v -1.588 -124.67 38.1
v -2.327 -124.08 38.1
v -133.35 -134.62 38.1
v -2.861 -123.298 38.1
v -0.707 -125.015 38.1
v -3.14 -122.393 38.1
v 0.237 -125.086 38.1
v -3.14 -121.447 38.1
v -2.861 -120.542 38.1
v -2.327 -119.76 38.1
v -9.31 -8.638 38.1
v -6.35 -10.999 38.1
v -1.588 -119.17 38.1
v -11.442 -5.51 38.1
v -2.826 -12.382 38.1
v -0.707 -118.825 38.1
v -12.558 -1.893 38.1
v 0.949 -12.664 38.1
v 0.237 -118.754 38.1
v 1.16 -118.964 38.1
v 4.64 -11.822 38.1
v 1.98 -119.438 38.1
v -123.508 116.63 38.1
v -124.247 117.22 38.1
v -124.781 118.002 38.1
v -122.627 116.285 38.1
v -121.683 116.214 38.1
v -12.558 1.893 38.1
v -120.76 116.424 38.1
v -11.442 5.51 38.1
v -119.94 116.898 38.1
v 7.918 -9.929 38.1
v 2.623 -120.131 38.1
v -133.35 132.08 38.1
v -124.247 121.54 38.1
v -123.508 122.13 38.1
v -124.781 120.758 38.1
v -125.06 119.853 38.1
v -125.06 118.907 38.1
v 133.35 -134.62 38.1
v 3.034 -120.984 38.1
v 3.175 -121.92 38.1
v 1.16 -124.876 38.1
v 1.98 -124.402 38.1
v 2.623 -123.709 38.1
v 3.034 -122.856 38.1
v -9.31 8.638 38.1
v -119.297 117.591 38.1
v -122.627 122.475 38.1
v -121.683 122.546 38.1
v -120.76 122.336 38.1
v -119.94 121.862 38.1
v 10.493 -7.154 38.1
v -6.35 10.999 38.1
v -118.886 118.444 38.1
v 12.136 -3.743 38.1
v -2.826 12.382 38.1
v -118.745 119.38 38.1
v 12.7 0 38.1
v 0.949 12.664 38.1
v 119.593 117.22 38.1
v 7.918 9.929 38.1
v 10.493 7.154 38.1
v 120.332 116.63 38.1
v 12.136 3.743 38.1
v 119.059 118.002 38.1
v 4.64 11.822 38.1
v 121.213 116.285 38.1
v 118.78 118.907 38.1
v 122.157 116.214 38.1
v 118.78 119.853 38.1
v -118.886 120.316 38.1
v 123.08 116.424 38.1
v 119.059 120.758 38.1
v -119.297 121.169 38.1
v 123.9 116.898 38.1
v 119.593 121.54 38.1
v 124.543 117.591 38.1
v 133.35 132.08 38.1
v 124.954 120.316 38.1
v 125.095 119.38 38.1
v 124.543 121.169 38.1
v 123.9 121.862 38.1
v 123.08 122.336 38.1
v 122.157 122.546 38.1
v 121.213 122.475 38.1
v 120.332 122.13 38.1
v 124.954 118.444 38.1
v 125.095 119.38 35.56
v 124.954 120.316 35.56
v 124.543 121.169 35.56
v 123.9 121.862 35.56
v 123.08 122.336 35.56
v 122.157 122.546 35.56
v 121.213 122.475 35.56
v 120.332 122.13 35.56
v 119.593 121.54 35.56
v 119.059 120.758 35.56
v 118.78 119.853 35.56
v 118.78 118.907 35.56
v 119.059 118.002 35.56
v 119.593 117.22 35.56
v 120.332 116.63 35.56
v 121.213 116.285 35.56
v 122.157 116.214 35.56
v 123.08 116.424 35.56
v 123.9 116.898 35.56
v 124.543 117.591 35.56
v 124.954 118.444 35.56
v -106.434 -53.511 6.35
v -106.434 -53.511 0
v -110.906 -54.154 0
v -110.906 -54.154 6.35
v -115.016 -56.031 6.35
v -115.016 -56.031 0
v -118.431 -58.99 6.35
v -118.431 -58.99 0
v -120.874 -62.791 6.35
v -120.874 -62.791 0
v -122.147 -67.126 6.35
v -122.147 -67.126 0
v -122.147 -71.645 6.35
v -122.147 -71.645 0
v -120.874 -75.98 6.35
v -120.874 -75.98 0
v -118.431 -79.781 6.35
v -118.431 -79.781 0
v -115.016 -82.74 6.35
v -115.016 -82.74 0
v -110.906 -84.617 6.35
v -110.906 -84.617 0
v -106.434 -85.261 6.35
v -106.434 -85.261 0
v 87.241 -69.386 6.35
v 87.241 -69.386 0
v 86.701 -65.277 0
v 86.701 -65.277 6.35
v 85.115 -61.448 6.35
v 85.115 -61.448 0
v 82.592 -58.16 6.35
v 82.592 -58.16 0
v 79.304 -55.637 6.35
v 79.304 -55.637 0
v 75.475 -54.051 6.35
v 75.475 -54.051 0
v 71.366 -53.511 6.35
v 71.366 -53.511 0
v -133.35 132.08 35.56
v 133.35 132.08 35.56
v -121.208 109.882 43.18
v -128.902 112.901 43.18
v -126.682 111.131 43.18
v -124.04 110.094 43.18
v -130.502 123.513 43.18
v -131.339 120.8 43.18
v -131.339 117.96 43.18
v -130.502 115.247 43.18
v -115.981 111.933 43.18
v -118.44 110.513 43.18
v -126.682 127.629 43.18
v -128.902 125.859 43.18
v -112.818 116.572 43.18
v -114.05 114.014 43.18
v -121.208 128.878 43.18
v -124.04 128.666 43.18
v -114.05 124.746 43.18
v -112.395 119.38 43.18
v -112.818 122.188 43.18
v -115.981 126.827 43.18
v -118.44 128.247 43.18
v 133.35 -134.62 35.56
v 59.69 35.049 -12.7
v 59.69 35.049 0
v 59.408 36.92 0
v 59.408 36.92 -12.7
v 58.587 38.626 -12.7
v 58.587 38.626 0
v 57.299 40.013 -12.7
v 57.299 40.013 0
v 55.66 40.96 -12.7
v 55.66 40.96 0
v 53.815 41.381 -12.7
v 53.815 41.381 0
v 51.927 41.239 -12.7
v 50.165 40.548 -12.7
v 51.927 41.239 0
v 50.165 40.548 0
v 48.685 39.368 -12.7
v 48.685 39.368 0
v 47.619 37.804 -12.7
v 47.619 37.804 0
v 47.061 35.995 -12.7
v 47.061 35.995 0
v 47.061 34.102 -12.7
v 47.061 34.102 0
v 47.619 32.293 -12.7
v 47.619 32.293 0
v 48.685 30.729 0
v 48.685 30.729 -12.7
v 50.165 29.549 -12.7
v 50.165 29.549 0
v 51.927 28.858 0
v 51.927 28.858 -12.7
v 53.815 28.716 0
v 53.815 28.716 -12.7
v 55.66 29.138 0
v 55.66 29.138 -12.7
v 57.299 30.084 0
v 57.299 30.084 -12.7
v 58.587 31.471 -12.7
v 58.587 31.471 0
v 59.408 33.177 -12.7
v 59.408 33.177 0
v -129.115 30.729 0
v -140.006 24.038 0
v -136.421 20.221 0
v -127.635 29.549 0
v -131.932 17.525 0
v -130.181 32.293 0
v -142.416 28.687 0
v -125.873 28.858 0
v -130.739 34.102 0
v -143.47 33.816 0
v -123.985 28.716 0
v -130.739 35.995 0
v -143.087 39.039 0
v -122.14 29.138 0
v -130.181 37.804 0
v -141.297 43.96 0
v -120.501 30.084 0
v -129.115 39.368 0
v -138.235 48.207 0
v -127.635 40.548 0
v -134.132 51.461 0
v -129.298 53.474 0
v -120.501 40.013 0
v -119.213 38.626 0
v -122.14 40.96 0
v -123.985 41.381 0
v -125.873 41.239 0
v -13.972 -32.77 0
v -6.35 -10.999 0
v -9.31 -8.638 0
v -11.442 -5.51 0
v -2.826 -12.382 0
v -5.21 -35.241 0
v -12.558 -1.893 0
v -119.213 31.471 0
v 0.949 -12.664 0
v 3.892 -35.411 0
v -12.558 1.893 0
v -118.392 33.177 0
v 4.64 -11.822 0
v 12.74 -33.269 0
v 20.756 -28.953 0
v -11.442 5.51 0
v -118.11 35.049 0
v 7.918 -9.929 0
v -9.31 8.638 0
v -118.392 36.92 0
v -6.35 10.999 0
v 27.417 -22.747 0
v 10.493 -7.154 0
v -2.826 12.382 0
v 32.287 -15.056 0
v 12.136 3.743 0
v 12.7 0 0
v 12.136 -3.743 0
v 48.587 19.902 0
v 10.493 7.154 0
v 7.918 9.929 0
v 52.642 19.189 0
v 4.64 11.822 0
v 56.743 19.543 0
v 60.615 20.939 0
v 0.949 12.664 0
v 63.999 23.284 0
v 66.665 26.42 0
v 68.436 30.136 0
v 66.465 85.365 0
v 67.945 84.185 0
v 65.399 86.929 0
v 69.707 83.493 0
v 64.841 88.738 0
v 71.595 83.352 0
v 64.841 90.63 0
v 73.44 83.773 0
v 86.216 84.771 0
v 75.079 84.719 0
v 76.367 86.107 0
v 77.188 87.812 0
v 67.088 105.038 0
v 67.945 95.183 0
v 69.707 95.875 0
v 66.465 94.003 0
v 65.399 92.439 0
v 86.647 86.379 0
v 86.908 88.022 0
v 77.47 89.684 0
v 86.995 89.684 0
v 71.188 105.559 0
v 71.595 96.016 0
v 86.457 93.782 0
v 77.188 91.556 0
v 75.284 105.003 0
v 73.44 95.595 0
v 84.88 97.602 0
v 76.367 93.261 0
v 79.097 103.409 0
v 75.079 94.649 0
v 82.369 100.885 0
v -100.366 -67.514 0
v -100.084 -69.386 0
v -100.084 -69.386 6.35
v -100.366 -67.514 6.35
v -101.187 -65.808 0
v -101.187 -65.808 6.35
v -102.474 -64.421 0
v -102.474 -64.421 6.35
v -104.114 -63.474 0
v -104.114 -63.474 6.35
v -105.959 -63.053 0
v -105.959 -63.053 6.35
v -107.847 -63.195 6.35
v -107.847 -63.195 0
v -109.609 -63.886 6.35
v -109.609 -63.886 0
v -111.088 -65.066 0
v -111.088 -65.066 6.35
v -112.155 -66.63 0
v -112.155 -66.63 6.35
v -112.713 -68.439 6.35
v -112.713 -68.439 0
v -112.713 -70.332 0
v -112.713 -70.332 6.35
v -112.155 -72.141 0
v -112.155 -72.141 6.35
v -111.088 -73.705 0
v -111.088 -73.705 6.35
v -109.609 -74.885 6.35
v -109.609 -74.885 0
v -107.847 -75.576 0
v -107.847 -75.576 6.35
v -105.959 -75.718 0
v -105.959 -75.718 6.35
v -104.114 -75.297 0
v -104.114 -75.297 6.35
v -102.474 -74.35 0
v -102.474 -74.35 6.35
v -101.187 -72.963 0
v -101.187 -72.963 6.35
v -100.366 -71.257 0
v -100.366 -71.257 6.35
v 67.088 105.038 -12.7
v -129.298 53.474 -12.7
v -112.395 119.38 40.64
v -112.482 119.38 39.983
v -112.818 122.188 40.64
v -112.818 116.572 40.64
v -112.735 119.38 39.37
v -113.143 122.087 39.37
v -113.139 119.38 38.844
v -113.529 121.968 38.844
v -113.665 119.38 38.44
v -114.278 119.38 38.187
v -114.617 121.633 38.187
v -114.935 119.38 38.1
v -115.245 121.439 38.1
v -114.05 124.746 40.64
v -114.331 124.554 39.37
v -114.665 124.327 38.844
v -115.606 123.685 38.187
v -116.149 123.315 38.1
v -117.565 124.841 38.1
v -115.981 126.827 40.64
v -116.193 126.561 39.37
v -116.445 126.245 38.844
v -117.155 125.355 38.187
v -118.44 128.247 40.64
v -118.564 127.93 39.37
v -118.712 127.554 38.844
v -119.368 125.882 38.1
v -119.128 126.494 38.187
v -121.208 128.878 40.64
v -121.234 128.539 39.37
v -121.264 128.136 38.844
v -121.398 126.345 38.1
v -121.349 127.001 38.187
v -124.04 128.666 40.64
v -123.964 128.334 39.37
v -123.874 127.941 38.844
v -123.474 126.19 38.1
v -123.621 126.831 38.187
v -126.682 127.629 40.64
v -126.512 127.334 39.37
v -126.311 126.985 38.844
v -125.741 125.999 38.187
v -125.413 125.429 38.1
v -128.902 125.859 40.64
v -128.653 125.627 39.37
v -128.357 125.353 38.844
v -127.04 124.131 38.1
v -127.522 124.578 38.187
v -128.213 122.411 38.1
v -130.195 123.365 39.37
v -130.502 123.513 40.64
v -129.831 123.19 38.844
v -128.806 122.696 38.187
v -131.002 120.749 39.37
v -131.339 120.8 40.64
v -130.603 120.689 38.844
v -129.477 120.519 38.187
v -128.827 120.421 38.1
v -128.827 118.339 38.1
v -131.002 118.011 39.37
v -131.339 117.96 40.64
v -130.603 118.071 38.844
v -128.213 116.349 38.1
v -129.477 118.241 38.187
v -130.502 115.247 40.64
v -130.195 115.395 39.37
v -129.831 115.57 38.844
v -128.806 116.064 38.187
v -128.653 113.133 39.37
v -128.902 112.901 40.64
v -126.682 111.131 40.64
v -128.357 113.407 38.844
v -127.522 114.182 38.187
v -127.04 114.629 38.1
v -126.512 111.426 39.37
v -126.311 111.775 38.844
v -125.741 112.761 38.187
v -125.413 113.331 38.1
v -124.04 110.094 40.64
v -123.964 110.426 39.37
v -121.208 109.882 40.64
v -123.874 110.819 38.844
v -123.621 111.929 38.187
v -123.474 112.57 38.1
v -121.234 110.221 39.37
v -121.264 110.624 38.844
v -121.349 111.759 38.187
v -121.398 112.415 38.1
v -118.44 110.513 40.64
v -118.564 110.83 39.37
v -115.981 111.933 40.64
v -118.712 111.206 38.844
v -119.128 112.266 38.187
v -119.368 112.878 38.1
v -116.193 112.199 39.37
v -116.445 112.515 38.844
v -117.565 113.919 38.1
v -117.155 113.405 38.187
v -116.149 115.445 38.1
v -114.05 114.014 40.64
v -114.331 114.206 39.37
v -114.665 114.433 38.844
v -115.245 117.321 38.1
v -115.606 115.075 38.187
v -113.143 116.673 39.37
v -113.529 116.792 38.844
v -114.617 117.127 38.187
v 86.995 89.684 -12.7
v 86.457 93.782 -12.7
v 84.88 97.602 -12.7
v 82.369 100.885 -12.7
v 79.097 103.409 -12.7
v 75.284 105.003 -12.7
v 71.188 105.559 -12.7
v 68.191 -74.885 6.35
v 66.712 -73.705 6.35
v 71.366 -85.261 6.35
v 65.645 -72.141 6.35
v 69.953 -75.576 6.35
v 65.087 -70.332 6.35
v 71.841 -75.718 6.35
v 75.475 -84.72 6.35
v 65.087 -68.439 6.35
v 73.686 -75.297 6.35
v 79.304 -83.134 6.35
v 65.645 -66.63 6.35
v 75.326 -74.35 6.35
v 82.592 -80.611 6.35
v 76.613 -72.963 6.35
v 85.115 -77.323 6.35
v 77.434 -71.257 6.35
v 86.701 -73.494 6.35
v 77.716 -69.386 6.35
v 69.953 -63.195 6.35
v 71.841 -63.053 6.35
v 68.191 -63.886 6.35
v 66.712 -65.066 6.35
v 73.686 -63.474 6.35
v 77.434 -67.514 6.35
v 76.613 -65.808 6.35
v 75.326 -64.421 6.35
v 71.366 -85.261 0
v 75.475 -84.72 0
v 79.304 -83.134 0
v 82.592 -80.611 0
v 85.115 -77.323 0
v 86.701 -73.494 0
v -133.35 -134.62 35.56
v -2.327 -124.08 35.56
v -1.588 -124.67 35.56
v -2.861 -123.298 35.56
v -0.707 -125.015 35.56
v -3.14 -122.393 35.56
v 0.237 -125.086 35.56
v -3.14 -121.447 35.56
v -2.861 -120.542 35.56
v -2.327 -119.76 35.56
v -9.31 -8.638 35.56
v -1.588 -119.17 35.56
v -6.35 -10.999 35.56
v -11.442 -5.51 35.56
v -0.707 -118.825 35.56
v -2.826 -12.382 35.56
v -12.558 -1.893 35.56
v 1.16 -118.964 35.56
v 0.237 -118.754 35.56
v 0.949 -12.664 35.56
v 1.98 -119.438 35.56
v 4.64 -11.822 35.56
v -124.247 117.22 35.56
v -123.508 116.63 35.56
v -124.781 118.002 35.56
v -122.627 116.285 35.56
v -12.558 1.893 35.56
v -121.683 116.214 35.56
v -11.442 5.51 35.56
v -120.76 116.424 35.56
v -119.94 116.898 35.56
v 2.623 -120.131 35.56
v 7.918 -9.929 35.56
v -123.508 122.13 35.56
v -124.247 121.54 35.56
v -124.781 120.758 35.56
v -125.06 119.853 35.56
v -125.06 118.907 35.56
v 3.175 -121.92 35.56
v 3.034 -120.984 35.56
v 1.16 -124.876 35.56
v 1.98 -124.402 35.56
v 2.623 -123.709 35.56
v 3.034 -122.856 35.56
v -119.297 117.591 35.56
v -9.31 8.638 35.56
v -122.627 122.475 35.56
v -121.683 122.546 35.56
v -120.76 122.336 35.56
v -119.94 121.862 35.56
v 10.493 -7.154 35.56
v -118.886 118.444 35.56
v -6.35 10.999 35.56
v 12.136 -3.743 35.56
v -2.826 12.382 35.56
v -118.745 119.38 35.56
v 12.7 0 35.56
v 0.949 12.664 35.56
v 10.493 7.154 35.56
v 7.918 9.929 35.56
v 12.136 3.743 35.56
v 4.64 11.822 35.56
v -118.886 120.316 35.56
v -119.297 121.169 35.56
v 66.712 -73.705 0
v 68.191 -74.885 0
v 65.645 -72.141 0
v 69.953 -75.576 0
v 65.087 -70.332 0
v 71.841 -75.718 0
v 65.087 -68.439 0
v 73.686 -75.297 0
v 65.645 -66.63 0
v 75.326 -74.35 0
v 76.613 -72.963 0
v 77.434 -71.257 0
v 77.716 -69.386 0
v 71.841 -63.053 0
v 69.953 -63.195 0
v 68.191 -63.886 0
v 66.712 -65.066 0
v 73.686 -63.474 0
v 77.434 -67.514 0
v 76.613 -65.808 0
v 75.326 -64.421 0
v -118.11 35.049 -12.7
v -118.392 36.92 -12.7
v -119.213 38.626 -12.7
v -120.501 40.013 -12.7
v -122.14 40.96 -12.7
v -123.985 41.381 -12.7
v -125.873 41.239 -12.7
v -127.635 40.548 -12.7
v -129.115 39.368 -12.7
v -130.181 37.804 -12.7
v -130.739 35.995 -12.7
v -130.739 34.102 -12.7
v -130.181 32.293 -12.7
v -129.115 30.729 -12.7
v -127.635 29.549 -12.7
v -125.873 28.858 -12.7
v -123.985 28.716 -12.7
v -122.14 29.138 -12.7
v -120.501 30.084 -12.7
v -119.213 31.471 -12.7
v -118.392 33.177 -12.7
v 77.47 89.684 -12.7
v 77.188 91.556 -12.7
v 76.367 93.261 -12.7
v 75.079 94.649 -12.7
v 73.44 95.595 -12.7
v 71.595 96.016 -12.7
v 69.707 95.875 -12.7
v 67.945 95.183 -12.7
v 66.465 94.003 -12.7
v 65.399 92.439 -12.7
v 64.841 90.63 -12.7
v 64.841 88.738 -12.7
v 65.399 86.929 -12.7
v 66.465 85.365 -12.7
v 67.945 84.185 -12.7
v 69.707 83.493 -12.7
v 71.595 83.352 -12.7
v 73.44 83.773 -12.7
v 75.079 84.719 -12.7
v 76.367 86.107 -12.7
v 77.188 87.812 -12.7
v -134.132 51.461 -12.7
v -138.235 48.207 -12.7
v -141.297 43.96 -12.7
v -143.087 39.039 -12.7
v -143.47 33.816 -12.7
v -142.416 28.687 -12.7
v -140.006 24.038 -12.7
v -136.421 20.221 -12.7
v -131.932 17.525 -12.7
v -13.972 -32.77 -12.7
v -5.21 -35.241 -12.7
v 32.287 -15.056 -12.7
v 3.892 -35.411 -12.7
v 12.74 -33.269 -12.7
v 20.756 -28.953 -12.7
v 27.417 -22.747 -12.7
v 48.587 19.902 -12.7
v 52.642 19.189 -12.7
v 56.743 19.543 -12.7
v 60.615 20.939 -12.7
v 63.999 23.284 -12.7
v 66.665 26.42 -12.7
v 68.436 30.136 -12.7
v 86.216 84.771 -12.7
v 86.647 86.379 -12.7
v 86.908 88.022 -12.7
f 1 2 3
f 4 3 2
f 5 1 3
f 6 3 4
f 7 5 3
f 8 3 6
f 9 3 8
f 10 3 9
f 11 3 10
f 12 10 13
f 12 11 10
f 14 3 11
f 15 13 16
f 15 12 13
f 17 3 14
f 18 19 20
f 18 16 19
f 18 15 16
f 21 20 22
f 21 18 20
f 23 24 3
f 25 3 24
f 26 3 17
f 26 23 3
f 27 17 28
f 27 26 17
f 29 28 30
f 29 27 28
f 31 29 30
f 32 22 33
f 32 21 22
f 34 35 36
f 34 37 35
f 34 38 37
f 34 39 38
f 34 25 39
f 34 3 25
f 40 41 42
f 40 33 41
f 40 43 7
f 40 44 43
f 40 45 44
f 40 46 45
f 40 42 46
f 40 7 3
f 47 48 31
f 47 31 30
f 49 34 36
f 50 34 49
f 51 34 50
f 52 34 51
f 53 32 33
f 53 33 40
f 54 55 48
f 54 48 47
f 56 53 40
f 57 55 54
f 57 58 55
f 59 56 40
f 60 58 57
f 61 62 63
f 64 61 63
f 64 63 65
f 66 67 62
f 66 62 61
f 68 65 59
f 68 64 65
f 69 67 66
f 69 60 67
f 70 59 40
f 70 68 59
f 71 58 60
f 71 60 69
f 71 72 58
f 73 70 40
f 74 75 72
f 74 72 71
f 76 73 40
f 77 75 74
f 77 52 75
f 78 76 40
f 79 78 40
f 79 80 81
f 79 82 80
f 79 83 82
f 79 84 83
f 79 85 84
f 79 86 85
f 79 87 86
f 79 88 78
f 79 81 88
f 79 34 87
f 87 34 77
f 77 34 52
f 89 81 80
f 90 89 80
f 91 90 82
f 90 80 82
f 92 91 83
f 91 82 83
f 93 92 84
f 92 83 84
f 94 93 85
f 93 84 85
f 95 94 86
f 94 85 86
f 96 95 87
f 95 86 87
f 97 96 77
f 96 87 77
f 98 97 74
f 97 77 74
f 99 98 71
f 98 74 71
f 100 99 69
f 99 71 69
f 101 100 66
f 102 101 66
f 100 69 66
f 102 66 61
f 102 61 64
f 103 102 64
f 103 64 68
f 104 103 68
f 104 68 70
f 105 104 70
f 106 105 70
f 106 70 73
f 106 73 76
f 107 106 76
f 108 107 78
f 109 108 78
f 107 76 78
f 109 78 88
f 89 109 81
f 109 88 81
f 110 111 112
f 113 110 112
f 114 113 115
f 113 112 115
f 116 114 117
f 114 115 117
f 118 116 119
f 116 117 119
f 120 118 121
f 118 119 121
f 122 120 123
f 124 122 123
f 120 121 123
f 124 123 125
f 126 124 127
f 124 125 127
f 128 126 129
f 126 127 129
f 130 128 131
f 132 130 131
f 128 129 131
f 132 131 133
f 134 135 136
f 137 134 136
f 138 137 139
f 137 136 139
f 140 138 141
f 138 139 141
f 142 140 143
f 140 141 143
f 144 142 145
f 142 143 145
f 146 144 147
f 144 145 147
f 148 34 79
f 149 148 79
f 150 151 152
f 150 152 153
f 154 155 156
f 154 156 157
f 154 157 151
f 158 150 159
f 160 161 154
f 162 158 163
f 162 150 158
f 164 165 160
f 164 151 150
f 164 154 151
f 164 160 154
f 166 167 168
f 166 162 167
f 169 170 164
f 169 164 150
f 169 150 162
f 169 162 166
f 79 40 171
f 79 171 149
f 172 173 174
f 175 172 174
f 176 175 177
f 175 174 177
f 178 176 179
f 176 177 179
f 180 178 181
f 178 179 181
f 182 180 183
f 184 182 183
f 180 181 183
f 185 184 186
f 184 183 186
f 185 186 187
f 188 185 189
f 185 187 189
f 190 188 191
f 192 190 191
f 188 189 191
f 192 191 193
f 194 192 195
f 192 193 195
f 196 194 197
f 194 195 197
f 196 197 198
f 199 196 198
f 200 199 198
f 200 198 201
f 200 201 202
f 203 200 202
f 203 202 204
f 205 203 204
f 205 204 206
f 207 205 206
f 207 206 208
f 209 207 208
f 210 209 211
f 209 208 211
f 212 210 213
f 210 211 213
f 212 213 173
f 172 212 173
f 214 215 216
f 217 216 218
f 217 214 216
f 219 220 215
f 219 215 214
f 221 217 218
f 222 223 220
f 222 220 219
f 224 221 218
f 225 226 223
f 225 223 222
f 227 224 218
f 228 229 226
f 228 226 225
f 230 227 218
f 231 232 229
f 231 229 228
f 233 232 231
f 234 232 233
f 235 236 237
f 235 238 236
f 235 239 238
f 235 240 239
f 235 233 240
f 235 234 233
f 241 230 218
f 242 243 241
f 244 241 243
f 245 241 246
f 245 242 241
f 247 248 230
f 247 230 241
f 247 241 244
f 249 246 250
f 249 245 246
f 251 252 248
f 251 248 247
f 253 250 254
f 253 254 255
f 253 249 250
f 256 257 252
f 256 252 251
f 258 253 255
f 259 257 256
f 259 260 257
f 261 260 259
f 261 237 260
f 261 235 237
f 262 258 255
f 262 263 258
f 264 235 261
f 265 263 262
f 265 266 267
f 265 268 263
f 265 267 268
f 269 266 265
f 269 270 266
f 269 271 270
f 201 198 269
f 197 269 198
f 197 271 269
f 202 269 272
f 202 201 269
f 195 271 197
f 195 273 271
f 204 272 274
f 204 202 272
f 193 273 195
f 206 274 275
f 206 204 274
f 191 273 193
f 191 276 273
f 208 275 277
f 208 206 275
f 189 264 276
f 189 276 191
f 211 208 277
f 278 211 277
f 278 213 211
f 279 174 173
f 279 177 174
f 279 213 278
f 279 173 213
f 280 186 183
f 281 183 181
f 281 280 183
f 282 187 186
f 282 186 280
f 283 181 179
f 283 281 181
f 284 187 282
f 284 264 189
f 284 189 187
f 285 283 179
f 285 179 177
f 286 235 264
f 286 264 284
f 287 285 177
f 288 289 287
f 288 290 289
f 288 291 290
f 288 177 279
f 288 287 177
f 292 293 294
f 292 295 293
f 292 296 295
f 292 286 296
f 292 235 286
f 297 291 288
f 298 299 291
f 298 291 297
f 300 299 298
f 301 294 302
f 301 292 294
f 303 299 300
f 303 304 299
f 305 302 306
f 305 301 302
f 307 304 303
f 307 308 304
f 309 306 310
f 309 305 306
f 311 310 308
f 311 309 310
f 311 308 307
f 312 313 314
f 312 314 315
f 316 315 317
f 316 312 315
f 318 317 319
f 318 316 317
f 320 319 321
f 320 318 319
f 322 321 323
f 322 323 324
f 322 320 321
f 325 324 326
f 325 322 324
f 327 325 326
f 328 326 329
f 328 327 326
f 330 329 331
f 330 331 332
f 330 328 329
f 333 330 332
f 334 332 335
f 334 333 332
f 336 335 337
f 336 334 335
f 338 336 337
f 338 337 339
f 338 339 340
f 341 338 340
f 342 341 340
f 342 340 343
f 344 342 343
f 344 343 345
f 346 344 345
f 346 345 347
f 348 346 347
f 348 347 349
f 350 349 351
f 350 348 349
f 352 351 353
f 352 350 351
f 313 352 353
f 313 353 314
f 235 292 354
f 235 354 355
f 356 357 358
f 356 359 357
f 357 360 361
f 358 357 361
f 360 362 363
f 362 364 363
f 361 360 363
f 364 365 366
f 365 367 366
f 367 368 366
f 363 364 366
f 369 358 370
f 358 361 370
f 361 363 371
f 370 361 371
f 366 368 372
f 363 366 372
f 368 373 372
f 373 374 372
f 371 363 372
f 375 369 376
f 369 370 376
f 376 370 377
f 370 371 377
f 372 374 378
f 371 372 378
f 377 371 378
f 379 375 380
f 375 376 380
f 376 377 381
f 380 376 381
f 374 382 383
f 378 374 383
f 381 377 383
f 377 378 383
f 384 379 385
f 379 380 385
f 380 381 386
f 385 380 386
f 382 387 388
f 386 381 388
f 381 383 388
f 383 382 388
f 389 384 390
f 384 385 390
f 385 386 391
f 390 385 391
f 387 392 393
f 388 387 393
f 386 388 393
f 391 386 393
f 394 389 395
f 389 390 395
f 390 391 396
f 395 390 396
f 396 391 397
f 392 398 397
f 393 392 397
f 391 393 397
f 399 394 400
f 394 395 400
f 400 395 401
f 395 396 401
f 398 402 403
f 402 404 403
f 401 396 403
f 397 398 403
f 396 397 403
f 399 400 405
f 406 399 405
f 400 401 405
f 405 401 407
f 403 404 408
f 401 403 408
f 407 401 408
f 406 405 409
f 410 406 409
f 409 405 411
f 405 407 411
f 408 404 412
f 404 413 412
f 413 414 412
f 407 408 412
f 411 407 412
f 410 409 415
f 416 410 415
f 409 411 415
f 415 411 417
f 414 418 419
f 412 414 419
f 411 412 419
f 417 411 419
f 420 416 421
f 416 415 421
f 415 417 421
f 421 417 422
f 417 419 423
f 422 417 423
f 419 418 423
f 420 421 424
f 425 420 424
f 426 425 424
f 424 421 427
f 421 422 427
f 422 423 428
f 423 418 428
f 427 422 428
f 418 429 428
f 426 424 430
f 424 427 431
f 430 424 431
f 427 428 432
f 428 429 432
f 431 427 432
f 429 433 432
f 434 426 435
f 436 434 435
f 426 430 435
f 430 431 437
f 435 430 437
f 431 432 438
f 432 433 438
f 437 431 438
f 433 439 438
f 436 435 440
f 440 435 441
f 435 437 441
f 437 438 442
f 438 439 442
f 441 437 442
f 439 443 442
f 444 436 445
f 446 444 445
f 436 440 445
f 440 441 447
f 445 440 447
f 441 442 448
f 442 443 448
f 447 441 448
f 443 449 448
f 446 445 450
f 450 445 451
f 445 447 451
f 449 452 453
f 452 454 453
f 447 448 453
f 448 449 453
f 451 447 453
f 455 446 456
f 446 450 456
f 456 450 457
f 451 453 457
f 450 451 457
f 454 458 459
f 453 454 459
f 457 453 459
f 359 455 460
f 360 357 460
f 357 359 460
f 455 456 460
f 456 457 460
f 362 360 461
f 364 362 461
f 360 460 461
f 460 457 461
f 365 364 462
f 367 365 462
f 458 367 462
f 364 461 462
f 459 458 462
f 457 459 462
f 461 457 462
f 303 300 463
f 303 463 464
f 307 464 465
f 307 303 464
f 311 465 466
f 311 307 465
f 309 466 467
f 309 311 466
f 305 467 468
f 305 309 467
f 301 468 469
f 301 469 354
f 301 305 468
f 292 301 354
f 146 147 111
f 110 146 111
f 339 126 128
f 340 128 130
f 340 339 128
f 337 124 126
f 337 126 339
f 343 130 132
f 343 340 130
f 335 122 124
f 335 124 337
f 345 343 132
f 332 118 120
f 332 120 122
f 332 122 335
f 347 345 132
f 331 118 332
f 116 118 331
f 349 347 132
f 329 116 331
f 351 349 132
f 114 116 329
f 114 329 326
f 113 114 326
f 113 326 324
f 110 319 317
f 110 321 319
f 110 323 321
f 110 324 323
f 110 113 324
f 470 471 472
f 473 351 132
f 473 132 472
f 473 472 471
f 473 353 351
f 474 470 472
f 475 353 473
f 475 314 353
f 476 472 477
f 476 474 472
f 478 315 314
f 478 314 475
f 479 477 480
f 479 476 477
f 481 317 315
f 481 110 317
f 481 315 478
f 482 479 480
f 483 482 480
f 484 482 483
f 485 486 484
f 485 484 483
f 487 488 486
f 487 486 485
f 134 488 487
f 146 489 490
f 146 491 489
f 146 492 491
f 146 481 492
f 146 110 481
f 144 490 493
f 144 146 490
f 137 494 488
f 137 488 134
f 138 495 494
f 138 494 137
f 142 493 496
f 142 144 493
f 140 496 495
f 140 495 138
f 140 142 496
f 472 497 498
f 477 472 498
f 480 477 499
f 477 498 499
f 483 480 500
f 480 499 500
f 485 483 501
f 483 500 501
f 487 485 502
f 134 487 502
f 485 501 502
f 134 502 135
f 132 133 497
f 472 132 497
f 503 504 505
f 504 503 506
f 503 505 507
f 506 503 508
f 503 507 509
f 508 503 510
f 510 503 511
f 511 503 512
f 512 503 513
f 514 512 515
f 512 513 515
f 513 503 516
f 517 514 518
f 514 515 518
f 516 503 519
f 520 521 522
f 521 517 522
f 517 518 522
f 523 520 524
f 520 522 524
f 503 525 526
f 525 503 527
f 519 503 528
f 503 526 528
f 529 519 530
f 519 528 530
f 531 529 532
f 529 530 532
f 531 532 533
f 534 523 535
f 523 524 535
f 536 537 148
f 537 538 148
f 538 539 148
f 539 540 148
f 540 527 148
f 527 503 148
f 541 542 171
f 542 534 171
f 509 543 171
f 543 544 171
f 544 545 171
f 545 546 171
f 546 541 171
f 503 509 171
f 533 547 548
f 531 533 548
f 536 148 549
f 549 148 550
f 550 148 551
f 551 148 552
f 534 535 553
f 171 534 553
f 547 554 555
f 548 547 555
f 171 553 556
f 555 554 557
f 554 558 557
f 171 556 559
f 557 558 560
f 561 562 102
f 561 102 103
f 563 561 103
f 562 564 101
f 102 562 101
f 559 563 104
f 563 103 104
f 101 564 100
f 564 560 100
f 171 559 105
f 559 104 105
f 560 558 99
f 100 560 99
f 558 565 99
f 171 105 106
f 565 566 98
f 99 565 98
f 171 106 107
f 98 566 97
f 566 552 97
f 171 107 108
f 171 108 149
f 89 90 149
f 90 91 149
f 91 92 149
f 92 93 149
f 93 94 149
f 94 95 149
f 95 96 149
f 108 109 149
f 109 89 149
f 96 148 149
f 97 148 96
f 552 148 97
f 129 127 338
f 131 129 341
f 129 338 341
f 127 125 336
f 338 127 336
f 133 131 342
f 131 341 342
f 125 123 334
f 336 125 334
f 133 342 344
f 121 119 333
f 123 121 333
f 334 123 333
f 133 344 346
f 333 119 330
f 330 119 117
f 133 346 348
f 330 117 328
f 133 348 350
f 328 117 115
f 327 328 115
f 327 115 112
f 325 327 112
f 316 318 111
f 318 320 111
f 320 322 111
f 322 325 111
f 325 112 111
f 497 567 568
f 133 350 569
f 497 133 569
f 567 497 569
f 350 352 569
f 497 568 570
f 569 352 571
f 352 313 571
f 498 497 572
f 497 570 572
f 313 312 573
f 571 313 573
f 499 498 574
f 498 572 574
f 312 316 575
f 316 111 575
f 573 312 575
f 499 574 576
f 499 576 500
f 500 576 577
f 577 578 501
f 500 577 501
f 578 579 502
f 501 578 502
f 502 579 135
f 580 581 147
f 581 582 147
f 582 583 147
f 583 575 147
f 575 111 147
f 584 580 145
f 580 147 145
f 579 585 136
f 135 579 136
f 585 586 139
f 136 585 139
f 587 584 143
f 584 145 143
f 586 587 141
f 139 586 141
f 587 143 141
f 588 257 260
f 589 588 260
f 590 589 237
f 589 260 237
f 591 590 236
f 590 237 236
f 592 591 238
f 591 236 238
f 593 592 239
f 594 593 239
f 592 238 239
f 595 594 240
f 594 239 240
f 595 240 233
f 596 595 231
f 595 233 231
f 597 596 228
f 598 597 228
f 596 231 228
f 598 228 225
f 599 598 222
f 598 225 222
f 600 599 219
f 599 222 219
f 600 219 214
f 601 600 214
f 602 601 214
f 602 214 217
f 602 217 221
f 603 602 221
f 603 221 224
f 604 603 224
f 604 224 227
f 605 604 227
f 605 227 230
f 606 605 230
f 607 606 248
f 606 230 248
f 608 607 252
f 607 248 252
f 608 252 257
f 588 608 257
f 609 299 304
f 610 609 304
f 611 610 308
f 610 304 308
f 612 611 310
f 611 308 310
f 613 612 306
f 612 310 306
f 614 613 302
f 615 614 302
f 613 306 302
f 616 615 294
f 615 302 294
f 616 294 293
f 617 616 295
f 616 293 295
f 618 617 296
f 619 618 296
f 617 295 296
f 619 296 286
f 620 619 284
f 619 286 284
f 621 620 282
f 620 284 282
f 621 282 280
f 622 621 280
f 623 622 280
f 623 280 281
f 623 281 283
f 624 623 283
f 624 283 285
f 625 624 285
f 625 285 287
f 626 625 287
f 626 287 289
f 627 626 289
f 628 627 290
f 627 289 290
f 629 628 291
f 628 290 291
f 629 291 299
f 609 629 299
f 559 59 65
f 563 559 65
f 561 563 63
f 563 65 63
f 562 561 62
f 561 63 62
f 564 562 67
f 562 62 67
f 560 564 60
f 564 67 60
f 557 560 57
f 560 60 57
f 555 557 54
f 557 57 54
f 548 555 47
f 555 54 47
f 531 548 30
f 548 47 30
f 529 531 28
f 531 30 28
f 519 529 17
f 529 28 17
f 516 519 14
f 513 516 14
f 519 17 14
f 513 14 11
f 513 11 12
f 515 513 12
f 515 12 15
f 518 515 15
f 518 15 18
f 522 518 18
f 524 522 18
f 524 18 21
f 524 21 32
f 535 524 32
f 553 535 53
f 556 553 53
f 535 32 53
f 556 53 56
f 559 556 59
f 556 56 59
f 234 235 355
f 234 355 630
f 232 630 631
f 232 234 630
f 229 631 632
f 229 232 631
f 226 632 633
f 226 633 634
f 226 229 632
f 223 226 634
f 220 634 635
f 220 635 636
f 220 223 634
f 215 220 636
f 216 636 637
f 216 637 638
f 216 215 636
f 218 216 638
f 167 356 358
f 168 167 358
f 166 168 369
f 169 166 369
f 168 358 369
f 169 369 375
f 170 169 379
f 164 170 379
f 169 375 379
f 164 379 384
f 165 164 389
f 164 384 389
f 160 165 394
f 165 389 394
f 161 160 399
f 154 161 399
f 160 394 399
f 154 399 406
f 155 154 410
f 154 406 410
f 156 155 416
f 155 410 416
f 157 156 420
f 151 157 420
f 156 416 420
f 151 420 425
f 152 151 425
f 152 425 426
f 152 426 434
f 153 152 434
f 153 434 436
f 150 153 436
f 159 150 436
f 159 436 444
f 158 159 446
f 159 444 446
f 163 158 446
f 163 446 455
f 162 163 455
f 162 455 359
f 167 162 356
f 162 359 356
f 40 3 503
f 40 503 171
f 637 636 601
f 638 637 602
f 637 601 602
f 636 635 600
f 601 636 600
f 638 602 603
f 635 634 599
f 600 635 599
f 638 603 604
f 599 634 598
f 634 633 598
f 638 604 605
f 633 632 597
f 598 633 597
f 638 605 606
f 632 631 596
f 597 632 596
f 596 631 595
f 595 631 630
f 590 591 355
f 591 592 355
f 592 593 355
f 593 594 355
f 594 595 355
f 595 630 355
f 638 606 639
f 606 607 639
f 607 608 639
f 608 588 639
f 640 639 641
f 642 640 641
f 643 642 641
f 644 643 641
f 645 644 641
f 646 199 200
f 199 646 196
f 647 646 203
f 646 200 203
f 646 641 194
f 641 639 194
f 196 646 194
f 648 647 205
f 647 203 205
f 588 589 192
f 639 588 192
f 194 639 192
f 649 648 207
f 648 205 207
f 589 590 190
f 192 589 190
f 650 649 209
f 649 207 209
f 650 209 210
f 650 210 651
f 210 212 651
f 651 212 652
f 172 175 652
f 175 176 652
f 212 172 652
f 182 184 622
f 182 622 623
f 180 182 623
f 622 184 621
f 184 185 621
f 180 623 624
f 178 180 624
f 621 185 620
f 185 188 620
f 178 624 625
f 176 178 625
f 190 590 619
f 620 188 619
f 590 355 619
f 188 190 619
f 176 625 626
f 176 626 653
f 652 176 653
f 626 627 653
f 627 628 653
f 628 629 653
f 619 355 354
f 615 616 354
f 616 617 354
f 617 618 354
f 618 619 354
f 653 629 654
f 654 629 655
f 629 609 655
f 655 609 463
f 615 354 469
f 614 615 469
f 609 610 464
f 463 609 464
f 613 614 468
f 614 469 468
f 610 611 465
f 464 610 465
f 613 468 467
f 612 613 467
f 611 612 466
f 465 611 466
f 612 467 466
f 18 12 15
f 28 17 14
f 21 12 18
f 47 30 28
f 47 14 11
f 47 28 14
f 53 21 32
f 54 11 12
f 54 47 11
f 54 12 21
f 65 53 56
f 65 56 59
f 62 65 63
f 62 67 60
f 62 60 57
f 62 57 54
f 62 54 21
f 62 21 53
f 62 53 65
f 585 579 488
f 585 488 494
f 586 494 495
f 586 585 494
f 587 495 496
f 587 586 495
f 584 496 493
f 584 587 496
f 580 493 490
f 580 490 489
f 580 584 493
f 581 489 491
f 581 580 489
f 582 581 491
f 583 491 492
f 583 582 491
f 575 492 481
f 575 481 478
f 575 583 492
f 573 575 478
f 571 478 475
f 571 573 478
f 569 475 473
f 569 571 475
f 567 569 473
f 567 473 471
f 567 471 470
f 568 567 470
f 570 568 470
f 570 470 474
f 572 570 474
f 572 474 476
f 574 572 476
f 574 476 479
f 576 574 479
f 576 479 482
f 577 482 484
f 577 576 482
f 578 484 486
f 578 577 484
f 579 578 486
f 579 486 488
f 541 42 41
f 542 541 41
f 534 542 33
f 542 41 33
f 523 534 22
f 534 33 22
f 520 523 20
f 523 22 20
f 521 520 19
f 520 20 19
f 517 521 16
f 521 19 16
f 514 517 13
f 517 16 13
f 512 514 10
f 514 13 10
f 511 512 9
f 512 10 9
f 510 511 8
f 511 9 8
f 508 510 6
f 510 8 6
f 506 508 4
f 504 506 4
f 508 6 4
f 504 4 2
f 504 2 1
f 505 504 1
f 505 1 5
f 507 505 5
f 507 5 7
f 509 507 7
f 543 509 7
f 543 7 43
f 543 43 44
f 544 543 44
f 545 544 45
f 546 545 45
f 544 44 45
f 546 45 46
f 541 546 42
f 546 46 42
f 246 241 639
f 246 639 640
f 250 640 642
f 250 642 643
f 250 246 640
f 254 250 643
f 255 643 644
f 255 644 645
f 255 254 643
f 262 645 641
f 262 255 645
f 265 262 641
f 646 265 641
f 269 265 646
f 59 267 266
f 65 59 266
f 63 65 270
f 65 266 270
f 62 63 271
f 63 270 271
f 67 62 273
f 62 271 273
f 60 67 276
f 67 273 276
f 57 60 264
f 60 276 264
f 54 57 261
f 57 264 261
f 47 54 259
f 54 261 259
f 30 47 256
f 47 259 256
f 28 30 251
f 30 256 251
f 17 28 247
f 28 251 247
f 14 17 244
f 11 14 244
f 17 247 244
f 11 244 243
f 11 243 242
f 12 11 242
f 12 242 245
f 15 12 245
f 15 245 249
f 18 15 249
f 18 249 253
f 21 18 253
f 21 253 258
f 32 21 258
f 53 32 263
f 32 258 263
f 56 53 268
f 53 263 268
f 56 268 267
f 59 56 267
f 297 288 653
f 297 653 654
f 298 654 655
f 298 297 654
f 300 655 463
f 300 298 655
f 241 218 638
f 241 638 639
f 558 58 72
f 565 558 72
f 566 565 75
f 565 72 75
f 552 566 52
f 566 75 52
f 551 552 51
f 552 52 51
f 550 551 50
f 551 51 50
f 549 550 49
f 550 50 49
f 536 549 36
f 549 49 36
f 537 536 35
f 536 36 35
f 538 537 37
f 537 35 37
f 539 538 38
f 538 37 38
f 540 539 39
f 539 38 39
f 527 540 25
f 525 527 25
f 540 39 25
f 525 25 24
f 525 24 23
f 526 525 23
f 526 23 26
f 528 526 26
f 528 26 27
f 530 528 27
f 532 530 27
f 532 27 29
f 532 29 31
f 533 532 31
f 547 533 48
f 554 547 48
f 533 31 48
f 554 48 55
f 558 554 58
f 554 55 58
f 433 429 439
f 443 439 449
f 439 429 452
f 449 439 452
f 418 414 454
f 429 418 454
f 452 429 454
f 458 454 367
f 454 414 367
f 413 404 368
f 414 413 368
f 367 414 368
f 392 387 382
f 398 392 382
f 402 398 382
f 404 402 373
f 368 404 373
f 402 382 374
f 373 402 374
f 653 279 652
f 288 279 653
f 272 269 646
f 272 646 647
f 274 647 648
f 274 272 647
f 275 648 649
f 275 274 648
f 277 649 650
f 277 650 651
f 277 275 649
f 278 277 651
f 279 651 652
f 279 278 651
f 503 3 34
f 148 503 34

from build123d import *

# Parameters (mm, degrees)
F0_R     = 6.35
F0_R_2   = 12.7
F1_DEPTH = 12.7
F2_DEPTH = 38.1
F3_R     = 6.35
F4_DEPTH = 6.35
F5_W     = 266.7
F5_H     = 266.7
F5_R     = 9.525
F5_R_2   = 12.7
F5_R_3   = 3.175
F6_DEPTH = 2.54
F7_DEPTH = 5.08
F8_R     = 2.54


# Not quite as in the source:
# - a feature names something its author has since deleted; it is built from what else it names


with BuildPart() as f1:
    # F0 (on Top) → F1 (new body)
    with BuildSketch(Plane.XY):
        with BuildLine():
            ThreePointArc((-13.9723231754, -32.7700086168), (-19.638525588, 29.7225098602), (35.6244197099, 0))
            ThreePointArc((35.6244197099, 0), (34.7799787187, -7.7105356488), (32.2866889917, -15.0555303333))
            Line((32.2866889917, -15.0555303333), (48.5874802437, 19.9016293163))
            ThreePointArc((48.5874802437, 19.9016293163), (43.9440068681, 47.8442882261), (69.215, 35.0485491671))
            ThreePointArc((69.215, 35.0485491671), (69.018978903, 32.5615337753), (68.435756465, 30.1359366494))
            Line((68.435756465, 30.1359366494), (86.215756465, 84.7713366494))
            ThreePointArc((86.215756465, 84.7713366494), (59.5747274901, 78.7879724935), (67.0884102259, 105.0384895019))
            Line((67.0884102259, 105.0384895019), (-129.2979077289, 53.4739975689))
            ThreePointArc((-129.2979077289, 53.4739975689), (-112.8251309039, 50.1327236927), (-105.41, 35.0485491671))
            ThreePointArc((-105.41, 35.0485491671), (-113.9583857843, 19.1545692104), (-131.931637676, 17.5249328041))
            Line((-131.931637676, 17.5249328041), (-13.9723231754, -32.7700086168))
        make_face()
        with BuildLine():
            ThreePointArc((-129.2979077289, 53.4739975689), (-143.4590800142, 36.4404753919), (-131.931637676, 17.5249328041))
            ThreePointArc((-131.931637676, 17.5249328041), (-113.9583857843, 19.1545692104), (-105.41, 35.0485491671))
            ThreePointArc((-105.41, 35.0485491671), (-112.8251309039, 50.1327236927), (-129.2979077289, 53.4739975689))
        make_face()
        with Locations((-124.46, 35.0485491671)):
            Circle(F0_R, mode=Mode.SUBTRACT)
        with BuildLine():
            ThreePointArc((32.2866889917, -15.0555303333), (34.7799787187, -7.7105356488), (35.6244197099, 0))
            ThreePointArc((35.6244197099, 0), (-19.638525588, 29.7225098602), (-13.9723231754, -32.7700086168))
            ThreePointArc((-13.9723231754, -32.7700086168), (12.7398855579, -33.2685225947), (32.2866889917, -15.0555303333))
        make_face()
        Circle(F0_R_2, mode=Mode.SUBTRACT)
        with BuildLine():
            ThreePointArc((69.215, 35.0485491671), (43.9440068681, 47.8442882261), (48.5874802437, 19.9016293163))
            ThreePointArc((48.5874802437, 19.9016293163), (60.6153623999, 20.9388104399), (68.435756465, 30.1359366494))
            ThreePointArc((68.435756465, 30.1359366494), (69.018978903, 32.5615337753), (69.215, 35.0485491671))
        make_face()
        with Locations((53.34, 35.0485491671)):
            Circle(F0_R, mode=Mode.SUBTRACT)
        Circle(F0_R_2)
        with BuildLine():
            ThreePointArc((86.995, 89.6839491671), (80.8157242467, 102.2540946051), (67.0884102259, 105.0384895019))
            ThreePointArc((67.0884102259, 105.0384895019), (59.5747274901, 78.7879724935), (86.215756465, 84.7713366494))
            ThreePointArc((86.215756465, 84.7713366494), (86.798978903, 87.1969337753), (86.995, 89.6839491671))
        make_face()
        with Locations((71.12, 89.6839491671)):
            Circle(F0_R, mode=Mode.SUBTRACT)
    extrude(amount=-F1_DEPTH)

    # F0 (on Top) → F2 (join)
    with BuildSketch(Plane.XY):
        Circle(F0_R_2)
    extrude(amount=F2_DEPTH)


with BuildPart() as f4:
    # F3 (on Top) → F4 (new body)
    with BuildSketch(Plane.XY):
        with BuildLine():
            ThreePointArc((-106.4335181124, -85.2605211139), (-95.2081979611, -80.6108412652), (-90.5585181124, -69.3855211139))
            ThreePointArc((-90.5585181124, -69.3855211139), (-95.2081979611, -58.1602009625), (-106.4335181124, -53.5105211139))
            ThreePointArc((-106.4335181124, -53.5105211139), (-122.3085181124, -69.3855211139), (-106.4335181124, -85.2605211139))
        make_face()
        with Locations((-106.4335181124, -69.3855211139)):
            Circle(F3_R, mode=Mode.SUBTRACT)
        with BuildLine():
            ThreePointArc((-106.4335181124, -53.5105211139), (-95.2081979611, -58.1602009625), (-90.5585181124, -69.3855211139))
            ThreePointArc((-90.5585181124, -69.3855211139), (-95.2081979611, -80.6108412652), (-106.4335181124, -85.2605211139))
            Line((-106.4335181124, -85.2605211139), (71.3664818876, -85.2605211139))
            ThreePointArc((71.3664818876, -85.2605211139), (55.4914818876, -69.3855211139), (71.3664818876, -53.5105211139))
            Line((71.3664818876, -53.5105211139), (-106.4335181124, -53.5105211139))
        make_face()
        with BuildLine():
            ThreePointArc((87.2414818876, -69.3855211139), (82.5918020389, -58.1602009625), (71.3664818876, -53.5105211139))
            ThreePointArc((71.3664818876, -53.5105211139), (55.4914818876, -69.3855211139), (71.3664818876, -85.2605211139))
            ThreePointArc((71.3664818876, -85.2605211139), (82.5918020389, -80.6108412652), (87.2414818876, -69.3855211139))
        make_face()
        with Locations((71.3664818876, -69.3855211139)):
            Circle(F3_R, mode=Mode.SUBTRACT)
    extrude(amount=F4_DEPTH)


with BuildPart() as f6:
    # F5 (on face) → F6 (new body)
    with BuildSketch(Plane.XY.offset(38.1)):
        with Locations((0, -1.27)):
            Rectangle(F5_W, F5_H)
        with Locations((0, -121.92)):
            Circle(F5_R, mode=Mode.SUBTRACT)
        with Locations((-121.92, 119.38)):
            Circle(F5_R, mode=Mode.SUBTRACT)
        Circle(F5_R_2, mode=Mode.SUBTRACT)
        with Locations((121.92, 119.38)):
            Circle(F5_R, mode=Mode.SUBTRACT)
        with Locations((-121.92, 119.38)):
            Circle(F5_R)
        with Locations((-121.92, 119.38)):
            Circle(F5_R_3, mode=Mode.SUBTRACT)
        with Locations((121.92, 119.38)):
            Circle(F5_R)
        with Locations((121.92, 119.38)):
            Circle(F5_R_3, mode=Mode.SUBTRACT)
        with Locations((0, -121.92)):
            Circle(F5_R)
        with Locations((0, -121.92)):
            Circle(F5_R_3, mode=Mode.SUBTRACT)
    extrude(amount=-F6_DEPTH)


with BuildPart() as f7:
    # F5 (on face) → F7 (new body)
    with BuildSketch(Plane.XY.offset(38.1)):
        with Locations((-121.92, 119.38)):
            Circle(F5_R)
        with Locations((-121.92, 119.38)):
            Circle(F5_R_3, mode=Mode.SUBTRACT)
        with Locations((-121.92, 119.38)):
            Circle(F5_R_3)
    extrude(amount=F7_DEPTH)

    # F8
    f8_edges = [f7.edges().sort_by_distance(p)[0] for p in [
        (-131.445, 119.38, 38.1),
    ]]
    fillet(f8_edges, radius=F8_R)


solid = Compound([f1.part, f4.part, f6.part, f7.part])
